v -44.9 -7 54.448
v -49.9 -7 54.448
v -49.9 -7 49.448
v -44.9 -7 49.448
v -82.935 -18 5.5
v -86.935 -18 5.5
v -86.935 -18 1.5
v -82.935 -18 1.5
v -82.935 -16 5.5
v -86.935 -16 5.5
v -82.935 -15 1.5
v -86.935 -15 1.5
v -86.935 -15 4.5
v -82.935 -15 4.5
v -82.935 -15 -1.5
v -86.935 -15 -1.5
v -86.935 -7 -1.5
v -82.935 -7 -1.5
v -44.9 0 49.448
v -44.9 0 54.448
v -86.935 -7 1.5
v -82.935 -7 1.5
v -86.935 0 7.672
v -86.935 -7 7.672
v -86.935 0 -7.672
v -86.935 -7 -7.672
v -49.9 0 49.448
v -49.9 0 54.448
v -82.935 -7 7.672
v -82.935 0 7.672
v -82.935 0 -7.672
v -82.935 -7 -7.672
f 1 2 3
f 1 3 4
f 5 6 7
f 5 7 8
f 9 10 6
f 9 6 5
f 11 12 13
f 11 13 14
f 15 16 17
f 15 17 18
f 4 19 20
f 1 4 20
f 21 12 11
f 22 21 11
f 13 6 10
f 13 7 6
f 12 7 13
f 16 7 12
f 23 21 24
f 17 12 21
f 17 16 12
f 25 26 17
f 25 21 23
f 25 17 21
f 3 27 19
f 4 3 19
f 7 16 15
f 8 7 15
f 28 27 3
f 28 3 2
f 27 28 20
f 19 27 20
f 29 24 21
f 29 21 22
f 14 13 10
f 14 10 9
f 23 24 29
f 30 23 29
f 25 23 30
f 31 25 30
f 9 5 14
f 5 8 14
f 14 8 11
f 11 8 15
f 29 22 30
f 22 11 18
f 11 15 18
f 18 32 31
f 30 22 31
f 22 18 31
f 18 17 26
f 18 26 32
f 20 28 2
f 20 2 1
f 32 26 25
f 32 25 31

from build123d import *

# Parameters (mm, degrees)
F1_W      = 5
F1_H      = 5
F2_DEPTH  = 7
F5_W      = 4
F5_H      = 15.3435859829
F6_DEPTH  = 7
F7_W      = 4
F7_H      = 3
F8_DEPTH  = 11
F9_W      = 4
F9_H      = 3
F10_DEPTH = 4
F11_SIZE  = 3
F12_SIZE  = 1


with BuildPart() as f2:
    # F1 (on Front) → F2 (new body)
    with BuildSketch(Plane.XZ):
        with Locations((-47.4, 51.9482120872)):
            Rectangle(F1_W, F1_H)
    extrude(amount=F2_DEPTH)


with BuildPart() as f6:
    # F5 (on Front) → F6 (new body)
    with BuildSketch(Plane.XZ):
        with Locations((-84.9350026808, 0)):
            Rectangle(F5_W, F5_H)
    extrude(amount=F6_DEPTH)

    # F7 (on face) → F8 (join)
    with BuildSketch(Plane.XZ.offset(7)):
        with Locations((-84.9350026808, 0)):
            Rectangle(F7_W, F7_H)
    extrude(amount=F8_DEPTH)

    # F9 (on face) → F10 (join)
    with BuildSketch(Plane.XY.offset(1.5)):
        with Locations((-84.9350026808, -16.5)):
            Rectangle(F9_W, F9_H)
    extrude(amount=F10_DEPTH)

    # F11
    f11_edges = [f6.edges().sort_by_distance(p)[0] for p in [
        (-84.935003, -18, -1.5),
    ]]
    chamfer(f11_edges, length=F11_SIZE)

    # F12
    f12_edges = [f6.edges().sort_by_distance(p)[0] for p in [
        (-84.935003, -15, 5.5),
    ]]
    chamfer(f12_edges, length=F12_SIZE)


solid = Compound([f2.part, f6.part])
